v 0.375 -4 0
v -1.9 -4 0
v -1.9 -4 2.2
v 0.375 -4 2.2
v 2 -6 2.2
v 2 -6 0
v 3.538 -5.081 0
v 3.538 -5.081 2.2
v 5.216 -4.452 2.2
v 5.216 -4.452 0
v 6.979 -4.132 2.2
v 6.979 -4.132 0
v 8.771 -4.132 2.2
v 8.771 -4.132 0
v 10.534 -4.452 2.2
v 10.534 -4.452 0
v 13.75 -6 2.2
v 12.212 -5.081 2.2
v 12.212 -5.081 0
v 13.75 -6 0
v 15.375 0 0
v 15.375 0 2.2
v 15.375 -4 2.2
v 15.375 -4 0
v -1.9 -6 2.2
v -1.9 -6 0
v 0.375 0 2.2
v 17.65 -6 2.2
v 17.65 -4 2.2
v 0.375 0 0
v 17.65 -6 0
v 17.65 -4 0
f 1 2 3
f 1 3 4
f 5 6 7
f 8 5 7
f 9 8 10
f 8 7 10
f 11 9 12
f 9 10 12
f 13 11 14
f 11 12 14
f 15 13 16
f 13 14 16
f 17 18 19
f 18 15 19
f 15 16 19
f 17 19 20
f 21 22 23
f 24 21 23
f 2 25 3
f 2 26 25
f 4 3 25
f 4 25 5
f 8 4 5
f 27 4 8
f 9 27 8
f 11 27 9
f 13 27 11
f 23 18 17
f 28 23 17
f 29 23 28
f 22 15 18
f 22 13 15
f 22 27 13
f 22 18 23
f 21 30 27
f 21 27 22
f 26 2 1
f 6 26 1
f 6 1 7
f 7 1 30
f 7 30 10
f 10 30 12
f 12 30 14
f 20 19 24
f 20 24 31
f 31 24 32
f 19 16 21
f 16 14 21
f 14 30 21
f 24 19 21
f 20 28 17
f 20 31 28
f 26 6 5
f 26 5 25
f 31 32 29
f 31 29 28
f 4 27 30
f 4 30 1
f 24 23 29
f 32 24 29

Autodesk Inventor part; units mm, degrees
ref_plane "YZ Plane" through (0, 0, 0) normal (1, 0, 0) x (0, 1, 0)
ref_plane "XZ Plane" through (0, 0, 0) normal (0, 1, 0) x (-1, 0, 0)
ref_plane "XY Plane" through (0, 0, 0) normal (0, 0, 1) x (1, 0, 0)
sketch "Sketch1" plane through (0, 0, 0) normal (0, 0, 1) x (1, 0, 0)
  line L0 (0, 0) -> (15.75, 0)
  line L1 (15.75, 0) -> (15.75, -4)
  line L2 (0, -4) -> (0, 0)
  line L3 (17.65, -4) -> (17.65, -6)
  line L4 (-1.9, -6) -> (-1.9, -4)
  line L5 (-1.9, -4) -> (0, -4)
  line L6 (15.75, -4) -> (17.65, -4)
  line L7 (2, 0) -> (2, -6) construction
  line L8 (13.75, 0) -> (13.75, -6) construction
  arc A0 (13.75, -6) -> (2, -6) centre (7.875, -14.0922) ccw
  line L9 (17.65, -6) -> (13.75, -6)
  line L10 (2, -6) -> (-1.9, -6)
  dimension "d2" = 1.9
  dimension "d3" = 4
  dimension "d4" = 2
  dimension "d5" = 15.75
  dimension "d6" = 2
  dimension "d7" = 2
  dimension "d8" = 10
extrude "Extrusion1" add sketch "Sketch1" along normal blind 2.2
sketch "Sketch2" plane through (0, 0, 2.2) normal (0, 0, 1) x (1, 0, 0)
  line L0 (0, 0) -> (0.375, 0)
  line L1 (0.375, 0) -> (0.375, -4)
  line L2 (0.375, -4) -> (0, -4)
  line L3 (0, -4) -> (0, 0)
  line L4 (15.75, 0) -> (0, 0) projected
  line L5 (15.75, 0) -> (15.375, 0)
  line L6 (15.375, 0) -> (15.375, -4)
  line L7 (15.375, -4) -> (15.75, -4)
  line L8 (15.75, -4) -> (15.75, 0)
  dimension "d11" = 15
  dimension "d12" = 4
extrude "Extrusion2" cut sketch "Sketch2" against normal up to surface (2.2 mm away)
properties part number "Light Pipe modern"
